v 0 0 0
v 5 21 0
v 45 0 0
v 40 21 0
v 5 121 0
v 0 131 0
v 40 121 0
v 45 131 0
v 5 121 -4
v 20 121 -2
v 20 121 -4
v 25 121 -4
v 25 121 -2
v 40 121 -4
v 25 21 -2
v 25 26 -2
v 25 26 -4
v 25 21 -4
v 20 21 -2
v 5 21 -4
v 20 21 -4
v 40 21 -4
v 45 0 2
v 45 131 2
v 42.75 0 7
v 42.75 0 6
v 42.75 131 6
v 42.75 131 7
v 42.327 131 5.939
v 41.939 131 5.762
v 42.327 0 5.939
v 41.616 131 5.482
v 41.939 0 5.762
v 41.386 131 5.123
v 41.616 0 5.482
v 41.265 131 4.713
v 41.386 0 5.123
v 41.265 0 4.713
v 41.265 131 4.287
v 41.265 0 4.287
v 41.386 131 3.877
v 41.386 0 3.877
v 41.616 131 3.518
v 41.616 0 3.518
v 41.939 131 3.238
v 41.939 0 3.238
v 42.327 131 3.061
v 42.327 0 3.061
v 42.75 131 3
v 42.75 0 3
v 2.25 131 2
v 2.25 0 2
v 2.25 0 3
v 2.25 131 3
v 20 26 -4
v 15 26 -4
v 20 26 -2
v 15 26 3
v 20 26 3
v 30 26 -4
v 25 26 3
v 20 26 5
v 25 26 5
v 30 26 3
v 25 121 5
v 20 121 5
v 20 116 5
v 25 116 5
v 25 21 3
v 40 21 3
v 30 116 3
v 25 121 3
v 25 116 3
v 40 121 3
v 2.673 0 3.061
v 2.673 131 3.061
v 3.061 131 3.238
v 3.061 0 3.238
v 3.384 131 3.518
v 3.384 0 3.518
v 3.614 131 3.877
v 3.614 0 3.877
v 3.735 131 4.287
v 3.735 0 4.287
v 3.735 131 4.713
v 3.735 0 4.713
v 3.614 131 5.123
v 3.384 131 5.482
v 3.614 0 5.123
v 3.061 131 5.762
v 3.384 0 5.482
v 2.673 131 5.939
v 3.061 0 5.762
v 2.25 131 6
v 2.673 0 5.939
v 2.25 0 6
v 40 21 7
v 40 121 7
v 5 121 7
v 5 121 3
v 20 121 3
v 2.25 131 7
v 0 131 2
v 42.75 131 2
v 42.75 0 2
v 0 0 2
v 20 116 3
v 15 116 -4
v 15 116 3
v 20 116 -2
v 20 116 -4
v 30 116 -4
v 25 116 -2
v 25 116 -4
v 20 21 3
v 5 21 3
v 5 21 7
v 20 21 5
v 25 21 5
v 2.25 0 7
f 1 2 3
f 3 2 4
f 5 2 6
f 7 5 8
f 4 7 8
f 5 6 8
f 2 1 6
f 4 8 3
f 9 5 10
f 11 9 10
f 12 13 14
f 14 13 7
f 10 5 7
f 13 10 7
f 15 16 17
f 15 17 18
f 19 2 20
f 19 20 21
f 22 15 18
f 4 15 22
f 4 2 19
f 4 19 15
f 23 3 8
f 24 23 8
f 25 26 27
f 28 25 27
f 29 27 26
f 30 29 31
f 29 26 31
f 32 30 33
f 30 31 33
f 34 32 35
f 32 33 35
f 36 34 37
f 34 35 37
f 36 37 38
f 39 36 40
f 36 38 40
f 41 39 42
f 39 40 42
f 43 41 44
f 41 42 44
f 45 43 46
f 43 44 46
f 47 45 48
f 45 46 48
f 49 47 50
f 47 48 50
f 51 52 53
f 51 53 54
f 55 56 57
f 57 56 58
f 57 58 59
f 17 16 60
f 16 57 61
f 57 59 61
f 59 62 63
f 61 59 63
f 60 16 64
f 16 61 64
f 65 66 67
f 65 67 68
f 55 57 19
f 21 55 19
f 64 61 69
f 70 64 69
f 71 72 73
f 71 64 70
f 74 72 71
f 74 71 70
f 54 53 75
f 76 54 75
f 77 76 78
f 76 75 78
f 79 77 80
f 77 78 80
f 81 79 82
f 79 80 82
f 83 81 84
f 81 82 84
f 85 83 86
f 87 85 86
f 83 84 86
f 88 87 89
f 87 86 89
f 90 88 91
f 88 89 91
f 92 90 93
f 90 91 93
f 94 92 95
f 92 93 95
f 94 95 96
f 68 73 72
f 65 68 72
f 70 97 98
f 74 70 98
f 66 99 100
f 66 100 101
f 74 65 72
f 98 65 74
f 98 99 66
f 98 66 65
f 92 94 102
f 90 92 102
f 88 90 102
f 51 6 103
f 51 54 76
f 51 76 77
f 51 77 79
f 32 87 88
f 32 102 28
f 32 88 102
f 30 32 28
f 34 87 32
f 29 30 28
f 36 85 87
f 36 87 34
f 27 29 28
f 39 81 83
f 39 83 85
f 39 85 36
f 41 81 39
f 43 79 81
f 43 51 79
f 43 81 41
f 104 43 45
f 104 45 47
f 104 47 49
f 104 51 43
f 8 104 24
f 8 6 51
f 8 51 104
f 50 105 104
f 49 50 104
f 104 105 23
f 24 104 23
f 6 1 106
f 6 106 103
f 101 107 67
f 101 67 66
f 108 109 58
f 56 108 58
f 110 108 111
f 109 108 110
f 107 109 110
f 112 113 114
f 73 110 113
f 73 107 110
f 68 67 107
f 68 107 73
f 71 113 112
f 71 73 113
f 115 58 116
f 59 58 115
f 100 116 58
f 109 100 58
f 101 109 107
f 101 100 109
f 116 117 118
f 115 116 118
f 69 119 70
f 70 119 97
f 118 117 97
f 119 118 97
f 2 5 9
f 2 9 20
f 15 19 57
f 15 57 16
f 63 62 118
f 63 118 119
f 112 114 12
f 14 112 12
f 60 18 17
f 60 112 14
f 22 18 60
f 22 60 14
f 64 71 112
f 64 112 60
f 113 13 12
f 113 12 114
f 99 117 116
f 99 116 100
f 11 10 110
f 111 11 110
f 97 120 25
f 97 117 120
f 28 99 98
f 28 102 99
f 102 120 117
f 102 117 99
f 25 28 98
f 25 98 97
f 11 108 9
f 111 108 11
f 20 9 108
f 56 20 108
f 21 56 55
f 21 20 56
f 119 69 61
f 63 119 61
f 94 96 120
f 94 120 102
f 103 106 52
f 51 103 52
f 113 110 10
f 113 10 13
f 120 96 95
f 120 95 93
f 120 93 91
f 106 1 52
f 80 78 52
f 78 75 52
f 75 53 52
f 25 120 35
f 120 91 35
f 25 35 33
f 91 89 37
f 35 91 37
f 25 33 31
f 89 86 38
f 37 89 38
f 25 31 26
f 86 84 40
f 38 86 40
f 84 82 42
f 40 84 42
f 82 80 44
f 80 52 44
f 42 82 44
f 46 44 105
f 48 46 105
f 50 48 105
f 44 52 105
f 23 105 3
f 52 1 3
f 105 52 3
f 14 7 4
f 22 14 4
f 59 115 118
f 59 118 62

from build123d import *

# Parameters (mm, degrees)
F0_W      = 45
F0_H      = 131
F1_DEPTH  = 2
F2_W      = 40.5
F2_H      = 131
F3_DEPTH  = 5
F5_W      = 35
F5_H      = 100
F6_DEPTH  = 4
F7_W      = 5
F7_H      = 100
F8_DEPTH  = 2
F4_W      = 15
F4_H      = 90
F9_DEPTH  = 7.001
F10_W     = 5
F10_H     = 5
F13_DEPTH = 2
F12_W     = 5
F12_H     = 5
F14_DEPTH = 4
F11_W     = 10
F11_H     = 100
F15_DEPTH = 4
F16_R     = 1.5
F17_DEPTH = 131.001


with BuildPart() as f1:
    # F0 (on Top) → F1 (new body)
    with BuildSketch(Plane.XY):
        with Locations((22.5, 65.5)):
            Rectangle(F0_W, F0_H)
    extrude(amount=F1_DEPTH)

    # F2 (on face) → F3 (join)
    with BuildSketch(Plane.XY.offset(2)):
        with Locations((22.5, 65.5)):
            Rectangle(F2_W, F2_H)
    extrude(amount=F3_DEPTH)

    # F5 (on face) → F6 (cut)
    with BuildSketch(Plane.XY.offset(7)):
        with Locations((22.5, 71)):
            Rectangle(F5_W, F5_H)
    extrude(amount=-F6_DEPTH, mode=Mode.SUBTRACT)

    # F7 (on face) → F8 (join)
    with BuildSketch(Plane.XY.offset(3)):
        with Locations((22.5, 71)):
            Rectangle(F7_W, F7_H)
    extrude(amount=F8_DEPTH)

    # F4 (on face) → F9 (cut, through all)
    with BuildSketch(Plane.XY.offset(7)):
        with Locations((22.5, 71)):
            Rectangle(F4_W, F4_H)
    extrude(amount=-F9_DEPTH, mode=Mode.SUBTRACT)

    # F10 (on face) → F13 (join)
    with BuildSketch(Plane(origin=(0, 0, 0), x_dir=(1, 0, 0), z_dir=(0, 0, -1))):
        with Locations((22.5, -118.5)):
            Rectangle(F10_W, F10_H)
        with Locations((22.5, -23.5)):
            Rectangle(F10_W, F10_H)
    extrude(amount=F13_DEPTH)

    # F12 (on face) → F14 (join)
    with BuildSketch(Plane(origin=(0, 0, 0), x_dir=(1, 0, 0), z_dir=(0, 0, -1))):
        with Locations((17.5, -23.5)):
            Rectangle(F12_W, F12_H)
        with Locations((27.5, -23.5)):
            Rectangle(F12_W, F12_H)
        with Locations((27.5, -118.5)):
            Rectangle(F12_W, F12_H)
        with Locations((17.5, -118.5)):
            Rectangle(F12_W, F12_H)
    extrude(amount=F14_DEPTH)

    # F11 (on face) → F15 (join)
    with BuildSketch(Plane(origin=(0, 0, 0), x_dir=(1, 0, 0), z_dir=(0, 0, -1))):
        with Locations((10, -71)):
            Rectangle(F11_W, F11_H)
        with Locations((35, -71)):
            Rectangle(F11_W, F11_H)
    extrude(amount=F15_DEPTH)

    # F16 (on face) → F17 (cut, through all)
    with BuildSketch(Plane.XZ):
        with Locations((2.25, 4.5)):
            Circle(F16_R)
        with Locations((42.75, 4.5)):
            Circle(F16_R)
    extrude(amount=-F17_DEPTH, mode=Mode.SUBTRACT)


solid = f1.part
